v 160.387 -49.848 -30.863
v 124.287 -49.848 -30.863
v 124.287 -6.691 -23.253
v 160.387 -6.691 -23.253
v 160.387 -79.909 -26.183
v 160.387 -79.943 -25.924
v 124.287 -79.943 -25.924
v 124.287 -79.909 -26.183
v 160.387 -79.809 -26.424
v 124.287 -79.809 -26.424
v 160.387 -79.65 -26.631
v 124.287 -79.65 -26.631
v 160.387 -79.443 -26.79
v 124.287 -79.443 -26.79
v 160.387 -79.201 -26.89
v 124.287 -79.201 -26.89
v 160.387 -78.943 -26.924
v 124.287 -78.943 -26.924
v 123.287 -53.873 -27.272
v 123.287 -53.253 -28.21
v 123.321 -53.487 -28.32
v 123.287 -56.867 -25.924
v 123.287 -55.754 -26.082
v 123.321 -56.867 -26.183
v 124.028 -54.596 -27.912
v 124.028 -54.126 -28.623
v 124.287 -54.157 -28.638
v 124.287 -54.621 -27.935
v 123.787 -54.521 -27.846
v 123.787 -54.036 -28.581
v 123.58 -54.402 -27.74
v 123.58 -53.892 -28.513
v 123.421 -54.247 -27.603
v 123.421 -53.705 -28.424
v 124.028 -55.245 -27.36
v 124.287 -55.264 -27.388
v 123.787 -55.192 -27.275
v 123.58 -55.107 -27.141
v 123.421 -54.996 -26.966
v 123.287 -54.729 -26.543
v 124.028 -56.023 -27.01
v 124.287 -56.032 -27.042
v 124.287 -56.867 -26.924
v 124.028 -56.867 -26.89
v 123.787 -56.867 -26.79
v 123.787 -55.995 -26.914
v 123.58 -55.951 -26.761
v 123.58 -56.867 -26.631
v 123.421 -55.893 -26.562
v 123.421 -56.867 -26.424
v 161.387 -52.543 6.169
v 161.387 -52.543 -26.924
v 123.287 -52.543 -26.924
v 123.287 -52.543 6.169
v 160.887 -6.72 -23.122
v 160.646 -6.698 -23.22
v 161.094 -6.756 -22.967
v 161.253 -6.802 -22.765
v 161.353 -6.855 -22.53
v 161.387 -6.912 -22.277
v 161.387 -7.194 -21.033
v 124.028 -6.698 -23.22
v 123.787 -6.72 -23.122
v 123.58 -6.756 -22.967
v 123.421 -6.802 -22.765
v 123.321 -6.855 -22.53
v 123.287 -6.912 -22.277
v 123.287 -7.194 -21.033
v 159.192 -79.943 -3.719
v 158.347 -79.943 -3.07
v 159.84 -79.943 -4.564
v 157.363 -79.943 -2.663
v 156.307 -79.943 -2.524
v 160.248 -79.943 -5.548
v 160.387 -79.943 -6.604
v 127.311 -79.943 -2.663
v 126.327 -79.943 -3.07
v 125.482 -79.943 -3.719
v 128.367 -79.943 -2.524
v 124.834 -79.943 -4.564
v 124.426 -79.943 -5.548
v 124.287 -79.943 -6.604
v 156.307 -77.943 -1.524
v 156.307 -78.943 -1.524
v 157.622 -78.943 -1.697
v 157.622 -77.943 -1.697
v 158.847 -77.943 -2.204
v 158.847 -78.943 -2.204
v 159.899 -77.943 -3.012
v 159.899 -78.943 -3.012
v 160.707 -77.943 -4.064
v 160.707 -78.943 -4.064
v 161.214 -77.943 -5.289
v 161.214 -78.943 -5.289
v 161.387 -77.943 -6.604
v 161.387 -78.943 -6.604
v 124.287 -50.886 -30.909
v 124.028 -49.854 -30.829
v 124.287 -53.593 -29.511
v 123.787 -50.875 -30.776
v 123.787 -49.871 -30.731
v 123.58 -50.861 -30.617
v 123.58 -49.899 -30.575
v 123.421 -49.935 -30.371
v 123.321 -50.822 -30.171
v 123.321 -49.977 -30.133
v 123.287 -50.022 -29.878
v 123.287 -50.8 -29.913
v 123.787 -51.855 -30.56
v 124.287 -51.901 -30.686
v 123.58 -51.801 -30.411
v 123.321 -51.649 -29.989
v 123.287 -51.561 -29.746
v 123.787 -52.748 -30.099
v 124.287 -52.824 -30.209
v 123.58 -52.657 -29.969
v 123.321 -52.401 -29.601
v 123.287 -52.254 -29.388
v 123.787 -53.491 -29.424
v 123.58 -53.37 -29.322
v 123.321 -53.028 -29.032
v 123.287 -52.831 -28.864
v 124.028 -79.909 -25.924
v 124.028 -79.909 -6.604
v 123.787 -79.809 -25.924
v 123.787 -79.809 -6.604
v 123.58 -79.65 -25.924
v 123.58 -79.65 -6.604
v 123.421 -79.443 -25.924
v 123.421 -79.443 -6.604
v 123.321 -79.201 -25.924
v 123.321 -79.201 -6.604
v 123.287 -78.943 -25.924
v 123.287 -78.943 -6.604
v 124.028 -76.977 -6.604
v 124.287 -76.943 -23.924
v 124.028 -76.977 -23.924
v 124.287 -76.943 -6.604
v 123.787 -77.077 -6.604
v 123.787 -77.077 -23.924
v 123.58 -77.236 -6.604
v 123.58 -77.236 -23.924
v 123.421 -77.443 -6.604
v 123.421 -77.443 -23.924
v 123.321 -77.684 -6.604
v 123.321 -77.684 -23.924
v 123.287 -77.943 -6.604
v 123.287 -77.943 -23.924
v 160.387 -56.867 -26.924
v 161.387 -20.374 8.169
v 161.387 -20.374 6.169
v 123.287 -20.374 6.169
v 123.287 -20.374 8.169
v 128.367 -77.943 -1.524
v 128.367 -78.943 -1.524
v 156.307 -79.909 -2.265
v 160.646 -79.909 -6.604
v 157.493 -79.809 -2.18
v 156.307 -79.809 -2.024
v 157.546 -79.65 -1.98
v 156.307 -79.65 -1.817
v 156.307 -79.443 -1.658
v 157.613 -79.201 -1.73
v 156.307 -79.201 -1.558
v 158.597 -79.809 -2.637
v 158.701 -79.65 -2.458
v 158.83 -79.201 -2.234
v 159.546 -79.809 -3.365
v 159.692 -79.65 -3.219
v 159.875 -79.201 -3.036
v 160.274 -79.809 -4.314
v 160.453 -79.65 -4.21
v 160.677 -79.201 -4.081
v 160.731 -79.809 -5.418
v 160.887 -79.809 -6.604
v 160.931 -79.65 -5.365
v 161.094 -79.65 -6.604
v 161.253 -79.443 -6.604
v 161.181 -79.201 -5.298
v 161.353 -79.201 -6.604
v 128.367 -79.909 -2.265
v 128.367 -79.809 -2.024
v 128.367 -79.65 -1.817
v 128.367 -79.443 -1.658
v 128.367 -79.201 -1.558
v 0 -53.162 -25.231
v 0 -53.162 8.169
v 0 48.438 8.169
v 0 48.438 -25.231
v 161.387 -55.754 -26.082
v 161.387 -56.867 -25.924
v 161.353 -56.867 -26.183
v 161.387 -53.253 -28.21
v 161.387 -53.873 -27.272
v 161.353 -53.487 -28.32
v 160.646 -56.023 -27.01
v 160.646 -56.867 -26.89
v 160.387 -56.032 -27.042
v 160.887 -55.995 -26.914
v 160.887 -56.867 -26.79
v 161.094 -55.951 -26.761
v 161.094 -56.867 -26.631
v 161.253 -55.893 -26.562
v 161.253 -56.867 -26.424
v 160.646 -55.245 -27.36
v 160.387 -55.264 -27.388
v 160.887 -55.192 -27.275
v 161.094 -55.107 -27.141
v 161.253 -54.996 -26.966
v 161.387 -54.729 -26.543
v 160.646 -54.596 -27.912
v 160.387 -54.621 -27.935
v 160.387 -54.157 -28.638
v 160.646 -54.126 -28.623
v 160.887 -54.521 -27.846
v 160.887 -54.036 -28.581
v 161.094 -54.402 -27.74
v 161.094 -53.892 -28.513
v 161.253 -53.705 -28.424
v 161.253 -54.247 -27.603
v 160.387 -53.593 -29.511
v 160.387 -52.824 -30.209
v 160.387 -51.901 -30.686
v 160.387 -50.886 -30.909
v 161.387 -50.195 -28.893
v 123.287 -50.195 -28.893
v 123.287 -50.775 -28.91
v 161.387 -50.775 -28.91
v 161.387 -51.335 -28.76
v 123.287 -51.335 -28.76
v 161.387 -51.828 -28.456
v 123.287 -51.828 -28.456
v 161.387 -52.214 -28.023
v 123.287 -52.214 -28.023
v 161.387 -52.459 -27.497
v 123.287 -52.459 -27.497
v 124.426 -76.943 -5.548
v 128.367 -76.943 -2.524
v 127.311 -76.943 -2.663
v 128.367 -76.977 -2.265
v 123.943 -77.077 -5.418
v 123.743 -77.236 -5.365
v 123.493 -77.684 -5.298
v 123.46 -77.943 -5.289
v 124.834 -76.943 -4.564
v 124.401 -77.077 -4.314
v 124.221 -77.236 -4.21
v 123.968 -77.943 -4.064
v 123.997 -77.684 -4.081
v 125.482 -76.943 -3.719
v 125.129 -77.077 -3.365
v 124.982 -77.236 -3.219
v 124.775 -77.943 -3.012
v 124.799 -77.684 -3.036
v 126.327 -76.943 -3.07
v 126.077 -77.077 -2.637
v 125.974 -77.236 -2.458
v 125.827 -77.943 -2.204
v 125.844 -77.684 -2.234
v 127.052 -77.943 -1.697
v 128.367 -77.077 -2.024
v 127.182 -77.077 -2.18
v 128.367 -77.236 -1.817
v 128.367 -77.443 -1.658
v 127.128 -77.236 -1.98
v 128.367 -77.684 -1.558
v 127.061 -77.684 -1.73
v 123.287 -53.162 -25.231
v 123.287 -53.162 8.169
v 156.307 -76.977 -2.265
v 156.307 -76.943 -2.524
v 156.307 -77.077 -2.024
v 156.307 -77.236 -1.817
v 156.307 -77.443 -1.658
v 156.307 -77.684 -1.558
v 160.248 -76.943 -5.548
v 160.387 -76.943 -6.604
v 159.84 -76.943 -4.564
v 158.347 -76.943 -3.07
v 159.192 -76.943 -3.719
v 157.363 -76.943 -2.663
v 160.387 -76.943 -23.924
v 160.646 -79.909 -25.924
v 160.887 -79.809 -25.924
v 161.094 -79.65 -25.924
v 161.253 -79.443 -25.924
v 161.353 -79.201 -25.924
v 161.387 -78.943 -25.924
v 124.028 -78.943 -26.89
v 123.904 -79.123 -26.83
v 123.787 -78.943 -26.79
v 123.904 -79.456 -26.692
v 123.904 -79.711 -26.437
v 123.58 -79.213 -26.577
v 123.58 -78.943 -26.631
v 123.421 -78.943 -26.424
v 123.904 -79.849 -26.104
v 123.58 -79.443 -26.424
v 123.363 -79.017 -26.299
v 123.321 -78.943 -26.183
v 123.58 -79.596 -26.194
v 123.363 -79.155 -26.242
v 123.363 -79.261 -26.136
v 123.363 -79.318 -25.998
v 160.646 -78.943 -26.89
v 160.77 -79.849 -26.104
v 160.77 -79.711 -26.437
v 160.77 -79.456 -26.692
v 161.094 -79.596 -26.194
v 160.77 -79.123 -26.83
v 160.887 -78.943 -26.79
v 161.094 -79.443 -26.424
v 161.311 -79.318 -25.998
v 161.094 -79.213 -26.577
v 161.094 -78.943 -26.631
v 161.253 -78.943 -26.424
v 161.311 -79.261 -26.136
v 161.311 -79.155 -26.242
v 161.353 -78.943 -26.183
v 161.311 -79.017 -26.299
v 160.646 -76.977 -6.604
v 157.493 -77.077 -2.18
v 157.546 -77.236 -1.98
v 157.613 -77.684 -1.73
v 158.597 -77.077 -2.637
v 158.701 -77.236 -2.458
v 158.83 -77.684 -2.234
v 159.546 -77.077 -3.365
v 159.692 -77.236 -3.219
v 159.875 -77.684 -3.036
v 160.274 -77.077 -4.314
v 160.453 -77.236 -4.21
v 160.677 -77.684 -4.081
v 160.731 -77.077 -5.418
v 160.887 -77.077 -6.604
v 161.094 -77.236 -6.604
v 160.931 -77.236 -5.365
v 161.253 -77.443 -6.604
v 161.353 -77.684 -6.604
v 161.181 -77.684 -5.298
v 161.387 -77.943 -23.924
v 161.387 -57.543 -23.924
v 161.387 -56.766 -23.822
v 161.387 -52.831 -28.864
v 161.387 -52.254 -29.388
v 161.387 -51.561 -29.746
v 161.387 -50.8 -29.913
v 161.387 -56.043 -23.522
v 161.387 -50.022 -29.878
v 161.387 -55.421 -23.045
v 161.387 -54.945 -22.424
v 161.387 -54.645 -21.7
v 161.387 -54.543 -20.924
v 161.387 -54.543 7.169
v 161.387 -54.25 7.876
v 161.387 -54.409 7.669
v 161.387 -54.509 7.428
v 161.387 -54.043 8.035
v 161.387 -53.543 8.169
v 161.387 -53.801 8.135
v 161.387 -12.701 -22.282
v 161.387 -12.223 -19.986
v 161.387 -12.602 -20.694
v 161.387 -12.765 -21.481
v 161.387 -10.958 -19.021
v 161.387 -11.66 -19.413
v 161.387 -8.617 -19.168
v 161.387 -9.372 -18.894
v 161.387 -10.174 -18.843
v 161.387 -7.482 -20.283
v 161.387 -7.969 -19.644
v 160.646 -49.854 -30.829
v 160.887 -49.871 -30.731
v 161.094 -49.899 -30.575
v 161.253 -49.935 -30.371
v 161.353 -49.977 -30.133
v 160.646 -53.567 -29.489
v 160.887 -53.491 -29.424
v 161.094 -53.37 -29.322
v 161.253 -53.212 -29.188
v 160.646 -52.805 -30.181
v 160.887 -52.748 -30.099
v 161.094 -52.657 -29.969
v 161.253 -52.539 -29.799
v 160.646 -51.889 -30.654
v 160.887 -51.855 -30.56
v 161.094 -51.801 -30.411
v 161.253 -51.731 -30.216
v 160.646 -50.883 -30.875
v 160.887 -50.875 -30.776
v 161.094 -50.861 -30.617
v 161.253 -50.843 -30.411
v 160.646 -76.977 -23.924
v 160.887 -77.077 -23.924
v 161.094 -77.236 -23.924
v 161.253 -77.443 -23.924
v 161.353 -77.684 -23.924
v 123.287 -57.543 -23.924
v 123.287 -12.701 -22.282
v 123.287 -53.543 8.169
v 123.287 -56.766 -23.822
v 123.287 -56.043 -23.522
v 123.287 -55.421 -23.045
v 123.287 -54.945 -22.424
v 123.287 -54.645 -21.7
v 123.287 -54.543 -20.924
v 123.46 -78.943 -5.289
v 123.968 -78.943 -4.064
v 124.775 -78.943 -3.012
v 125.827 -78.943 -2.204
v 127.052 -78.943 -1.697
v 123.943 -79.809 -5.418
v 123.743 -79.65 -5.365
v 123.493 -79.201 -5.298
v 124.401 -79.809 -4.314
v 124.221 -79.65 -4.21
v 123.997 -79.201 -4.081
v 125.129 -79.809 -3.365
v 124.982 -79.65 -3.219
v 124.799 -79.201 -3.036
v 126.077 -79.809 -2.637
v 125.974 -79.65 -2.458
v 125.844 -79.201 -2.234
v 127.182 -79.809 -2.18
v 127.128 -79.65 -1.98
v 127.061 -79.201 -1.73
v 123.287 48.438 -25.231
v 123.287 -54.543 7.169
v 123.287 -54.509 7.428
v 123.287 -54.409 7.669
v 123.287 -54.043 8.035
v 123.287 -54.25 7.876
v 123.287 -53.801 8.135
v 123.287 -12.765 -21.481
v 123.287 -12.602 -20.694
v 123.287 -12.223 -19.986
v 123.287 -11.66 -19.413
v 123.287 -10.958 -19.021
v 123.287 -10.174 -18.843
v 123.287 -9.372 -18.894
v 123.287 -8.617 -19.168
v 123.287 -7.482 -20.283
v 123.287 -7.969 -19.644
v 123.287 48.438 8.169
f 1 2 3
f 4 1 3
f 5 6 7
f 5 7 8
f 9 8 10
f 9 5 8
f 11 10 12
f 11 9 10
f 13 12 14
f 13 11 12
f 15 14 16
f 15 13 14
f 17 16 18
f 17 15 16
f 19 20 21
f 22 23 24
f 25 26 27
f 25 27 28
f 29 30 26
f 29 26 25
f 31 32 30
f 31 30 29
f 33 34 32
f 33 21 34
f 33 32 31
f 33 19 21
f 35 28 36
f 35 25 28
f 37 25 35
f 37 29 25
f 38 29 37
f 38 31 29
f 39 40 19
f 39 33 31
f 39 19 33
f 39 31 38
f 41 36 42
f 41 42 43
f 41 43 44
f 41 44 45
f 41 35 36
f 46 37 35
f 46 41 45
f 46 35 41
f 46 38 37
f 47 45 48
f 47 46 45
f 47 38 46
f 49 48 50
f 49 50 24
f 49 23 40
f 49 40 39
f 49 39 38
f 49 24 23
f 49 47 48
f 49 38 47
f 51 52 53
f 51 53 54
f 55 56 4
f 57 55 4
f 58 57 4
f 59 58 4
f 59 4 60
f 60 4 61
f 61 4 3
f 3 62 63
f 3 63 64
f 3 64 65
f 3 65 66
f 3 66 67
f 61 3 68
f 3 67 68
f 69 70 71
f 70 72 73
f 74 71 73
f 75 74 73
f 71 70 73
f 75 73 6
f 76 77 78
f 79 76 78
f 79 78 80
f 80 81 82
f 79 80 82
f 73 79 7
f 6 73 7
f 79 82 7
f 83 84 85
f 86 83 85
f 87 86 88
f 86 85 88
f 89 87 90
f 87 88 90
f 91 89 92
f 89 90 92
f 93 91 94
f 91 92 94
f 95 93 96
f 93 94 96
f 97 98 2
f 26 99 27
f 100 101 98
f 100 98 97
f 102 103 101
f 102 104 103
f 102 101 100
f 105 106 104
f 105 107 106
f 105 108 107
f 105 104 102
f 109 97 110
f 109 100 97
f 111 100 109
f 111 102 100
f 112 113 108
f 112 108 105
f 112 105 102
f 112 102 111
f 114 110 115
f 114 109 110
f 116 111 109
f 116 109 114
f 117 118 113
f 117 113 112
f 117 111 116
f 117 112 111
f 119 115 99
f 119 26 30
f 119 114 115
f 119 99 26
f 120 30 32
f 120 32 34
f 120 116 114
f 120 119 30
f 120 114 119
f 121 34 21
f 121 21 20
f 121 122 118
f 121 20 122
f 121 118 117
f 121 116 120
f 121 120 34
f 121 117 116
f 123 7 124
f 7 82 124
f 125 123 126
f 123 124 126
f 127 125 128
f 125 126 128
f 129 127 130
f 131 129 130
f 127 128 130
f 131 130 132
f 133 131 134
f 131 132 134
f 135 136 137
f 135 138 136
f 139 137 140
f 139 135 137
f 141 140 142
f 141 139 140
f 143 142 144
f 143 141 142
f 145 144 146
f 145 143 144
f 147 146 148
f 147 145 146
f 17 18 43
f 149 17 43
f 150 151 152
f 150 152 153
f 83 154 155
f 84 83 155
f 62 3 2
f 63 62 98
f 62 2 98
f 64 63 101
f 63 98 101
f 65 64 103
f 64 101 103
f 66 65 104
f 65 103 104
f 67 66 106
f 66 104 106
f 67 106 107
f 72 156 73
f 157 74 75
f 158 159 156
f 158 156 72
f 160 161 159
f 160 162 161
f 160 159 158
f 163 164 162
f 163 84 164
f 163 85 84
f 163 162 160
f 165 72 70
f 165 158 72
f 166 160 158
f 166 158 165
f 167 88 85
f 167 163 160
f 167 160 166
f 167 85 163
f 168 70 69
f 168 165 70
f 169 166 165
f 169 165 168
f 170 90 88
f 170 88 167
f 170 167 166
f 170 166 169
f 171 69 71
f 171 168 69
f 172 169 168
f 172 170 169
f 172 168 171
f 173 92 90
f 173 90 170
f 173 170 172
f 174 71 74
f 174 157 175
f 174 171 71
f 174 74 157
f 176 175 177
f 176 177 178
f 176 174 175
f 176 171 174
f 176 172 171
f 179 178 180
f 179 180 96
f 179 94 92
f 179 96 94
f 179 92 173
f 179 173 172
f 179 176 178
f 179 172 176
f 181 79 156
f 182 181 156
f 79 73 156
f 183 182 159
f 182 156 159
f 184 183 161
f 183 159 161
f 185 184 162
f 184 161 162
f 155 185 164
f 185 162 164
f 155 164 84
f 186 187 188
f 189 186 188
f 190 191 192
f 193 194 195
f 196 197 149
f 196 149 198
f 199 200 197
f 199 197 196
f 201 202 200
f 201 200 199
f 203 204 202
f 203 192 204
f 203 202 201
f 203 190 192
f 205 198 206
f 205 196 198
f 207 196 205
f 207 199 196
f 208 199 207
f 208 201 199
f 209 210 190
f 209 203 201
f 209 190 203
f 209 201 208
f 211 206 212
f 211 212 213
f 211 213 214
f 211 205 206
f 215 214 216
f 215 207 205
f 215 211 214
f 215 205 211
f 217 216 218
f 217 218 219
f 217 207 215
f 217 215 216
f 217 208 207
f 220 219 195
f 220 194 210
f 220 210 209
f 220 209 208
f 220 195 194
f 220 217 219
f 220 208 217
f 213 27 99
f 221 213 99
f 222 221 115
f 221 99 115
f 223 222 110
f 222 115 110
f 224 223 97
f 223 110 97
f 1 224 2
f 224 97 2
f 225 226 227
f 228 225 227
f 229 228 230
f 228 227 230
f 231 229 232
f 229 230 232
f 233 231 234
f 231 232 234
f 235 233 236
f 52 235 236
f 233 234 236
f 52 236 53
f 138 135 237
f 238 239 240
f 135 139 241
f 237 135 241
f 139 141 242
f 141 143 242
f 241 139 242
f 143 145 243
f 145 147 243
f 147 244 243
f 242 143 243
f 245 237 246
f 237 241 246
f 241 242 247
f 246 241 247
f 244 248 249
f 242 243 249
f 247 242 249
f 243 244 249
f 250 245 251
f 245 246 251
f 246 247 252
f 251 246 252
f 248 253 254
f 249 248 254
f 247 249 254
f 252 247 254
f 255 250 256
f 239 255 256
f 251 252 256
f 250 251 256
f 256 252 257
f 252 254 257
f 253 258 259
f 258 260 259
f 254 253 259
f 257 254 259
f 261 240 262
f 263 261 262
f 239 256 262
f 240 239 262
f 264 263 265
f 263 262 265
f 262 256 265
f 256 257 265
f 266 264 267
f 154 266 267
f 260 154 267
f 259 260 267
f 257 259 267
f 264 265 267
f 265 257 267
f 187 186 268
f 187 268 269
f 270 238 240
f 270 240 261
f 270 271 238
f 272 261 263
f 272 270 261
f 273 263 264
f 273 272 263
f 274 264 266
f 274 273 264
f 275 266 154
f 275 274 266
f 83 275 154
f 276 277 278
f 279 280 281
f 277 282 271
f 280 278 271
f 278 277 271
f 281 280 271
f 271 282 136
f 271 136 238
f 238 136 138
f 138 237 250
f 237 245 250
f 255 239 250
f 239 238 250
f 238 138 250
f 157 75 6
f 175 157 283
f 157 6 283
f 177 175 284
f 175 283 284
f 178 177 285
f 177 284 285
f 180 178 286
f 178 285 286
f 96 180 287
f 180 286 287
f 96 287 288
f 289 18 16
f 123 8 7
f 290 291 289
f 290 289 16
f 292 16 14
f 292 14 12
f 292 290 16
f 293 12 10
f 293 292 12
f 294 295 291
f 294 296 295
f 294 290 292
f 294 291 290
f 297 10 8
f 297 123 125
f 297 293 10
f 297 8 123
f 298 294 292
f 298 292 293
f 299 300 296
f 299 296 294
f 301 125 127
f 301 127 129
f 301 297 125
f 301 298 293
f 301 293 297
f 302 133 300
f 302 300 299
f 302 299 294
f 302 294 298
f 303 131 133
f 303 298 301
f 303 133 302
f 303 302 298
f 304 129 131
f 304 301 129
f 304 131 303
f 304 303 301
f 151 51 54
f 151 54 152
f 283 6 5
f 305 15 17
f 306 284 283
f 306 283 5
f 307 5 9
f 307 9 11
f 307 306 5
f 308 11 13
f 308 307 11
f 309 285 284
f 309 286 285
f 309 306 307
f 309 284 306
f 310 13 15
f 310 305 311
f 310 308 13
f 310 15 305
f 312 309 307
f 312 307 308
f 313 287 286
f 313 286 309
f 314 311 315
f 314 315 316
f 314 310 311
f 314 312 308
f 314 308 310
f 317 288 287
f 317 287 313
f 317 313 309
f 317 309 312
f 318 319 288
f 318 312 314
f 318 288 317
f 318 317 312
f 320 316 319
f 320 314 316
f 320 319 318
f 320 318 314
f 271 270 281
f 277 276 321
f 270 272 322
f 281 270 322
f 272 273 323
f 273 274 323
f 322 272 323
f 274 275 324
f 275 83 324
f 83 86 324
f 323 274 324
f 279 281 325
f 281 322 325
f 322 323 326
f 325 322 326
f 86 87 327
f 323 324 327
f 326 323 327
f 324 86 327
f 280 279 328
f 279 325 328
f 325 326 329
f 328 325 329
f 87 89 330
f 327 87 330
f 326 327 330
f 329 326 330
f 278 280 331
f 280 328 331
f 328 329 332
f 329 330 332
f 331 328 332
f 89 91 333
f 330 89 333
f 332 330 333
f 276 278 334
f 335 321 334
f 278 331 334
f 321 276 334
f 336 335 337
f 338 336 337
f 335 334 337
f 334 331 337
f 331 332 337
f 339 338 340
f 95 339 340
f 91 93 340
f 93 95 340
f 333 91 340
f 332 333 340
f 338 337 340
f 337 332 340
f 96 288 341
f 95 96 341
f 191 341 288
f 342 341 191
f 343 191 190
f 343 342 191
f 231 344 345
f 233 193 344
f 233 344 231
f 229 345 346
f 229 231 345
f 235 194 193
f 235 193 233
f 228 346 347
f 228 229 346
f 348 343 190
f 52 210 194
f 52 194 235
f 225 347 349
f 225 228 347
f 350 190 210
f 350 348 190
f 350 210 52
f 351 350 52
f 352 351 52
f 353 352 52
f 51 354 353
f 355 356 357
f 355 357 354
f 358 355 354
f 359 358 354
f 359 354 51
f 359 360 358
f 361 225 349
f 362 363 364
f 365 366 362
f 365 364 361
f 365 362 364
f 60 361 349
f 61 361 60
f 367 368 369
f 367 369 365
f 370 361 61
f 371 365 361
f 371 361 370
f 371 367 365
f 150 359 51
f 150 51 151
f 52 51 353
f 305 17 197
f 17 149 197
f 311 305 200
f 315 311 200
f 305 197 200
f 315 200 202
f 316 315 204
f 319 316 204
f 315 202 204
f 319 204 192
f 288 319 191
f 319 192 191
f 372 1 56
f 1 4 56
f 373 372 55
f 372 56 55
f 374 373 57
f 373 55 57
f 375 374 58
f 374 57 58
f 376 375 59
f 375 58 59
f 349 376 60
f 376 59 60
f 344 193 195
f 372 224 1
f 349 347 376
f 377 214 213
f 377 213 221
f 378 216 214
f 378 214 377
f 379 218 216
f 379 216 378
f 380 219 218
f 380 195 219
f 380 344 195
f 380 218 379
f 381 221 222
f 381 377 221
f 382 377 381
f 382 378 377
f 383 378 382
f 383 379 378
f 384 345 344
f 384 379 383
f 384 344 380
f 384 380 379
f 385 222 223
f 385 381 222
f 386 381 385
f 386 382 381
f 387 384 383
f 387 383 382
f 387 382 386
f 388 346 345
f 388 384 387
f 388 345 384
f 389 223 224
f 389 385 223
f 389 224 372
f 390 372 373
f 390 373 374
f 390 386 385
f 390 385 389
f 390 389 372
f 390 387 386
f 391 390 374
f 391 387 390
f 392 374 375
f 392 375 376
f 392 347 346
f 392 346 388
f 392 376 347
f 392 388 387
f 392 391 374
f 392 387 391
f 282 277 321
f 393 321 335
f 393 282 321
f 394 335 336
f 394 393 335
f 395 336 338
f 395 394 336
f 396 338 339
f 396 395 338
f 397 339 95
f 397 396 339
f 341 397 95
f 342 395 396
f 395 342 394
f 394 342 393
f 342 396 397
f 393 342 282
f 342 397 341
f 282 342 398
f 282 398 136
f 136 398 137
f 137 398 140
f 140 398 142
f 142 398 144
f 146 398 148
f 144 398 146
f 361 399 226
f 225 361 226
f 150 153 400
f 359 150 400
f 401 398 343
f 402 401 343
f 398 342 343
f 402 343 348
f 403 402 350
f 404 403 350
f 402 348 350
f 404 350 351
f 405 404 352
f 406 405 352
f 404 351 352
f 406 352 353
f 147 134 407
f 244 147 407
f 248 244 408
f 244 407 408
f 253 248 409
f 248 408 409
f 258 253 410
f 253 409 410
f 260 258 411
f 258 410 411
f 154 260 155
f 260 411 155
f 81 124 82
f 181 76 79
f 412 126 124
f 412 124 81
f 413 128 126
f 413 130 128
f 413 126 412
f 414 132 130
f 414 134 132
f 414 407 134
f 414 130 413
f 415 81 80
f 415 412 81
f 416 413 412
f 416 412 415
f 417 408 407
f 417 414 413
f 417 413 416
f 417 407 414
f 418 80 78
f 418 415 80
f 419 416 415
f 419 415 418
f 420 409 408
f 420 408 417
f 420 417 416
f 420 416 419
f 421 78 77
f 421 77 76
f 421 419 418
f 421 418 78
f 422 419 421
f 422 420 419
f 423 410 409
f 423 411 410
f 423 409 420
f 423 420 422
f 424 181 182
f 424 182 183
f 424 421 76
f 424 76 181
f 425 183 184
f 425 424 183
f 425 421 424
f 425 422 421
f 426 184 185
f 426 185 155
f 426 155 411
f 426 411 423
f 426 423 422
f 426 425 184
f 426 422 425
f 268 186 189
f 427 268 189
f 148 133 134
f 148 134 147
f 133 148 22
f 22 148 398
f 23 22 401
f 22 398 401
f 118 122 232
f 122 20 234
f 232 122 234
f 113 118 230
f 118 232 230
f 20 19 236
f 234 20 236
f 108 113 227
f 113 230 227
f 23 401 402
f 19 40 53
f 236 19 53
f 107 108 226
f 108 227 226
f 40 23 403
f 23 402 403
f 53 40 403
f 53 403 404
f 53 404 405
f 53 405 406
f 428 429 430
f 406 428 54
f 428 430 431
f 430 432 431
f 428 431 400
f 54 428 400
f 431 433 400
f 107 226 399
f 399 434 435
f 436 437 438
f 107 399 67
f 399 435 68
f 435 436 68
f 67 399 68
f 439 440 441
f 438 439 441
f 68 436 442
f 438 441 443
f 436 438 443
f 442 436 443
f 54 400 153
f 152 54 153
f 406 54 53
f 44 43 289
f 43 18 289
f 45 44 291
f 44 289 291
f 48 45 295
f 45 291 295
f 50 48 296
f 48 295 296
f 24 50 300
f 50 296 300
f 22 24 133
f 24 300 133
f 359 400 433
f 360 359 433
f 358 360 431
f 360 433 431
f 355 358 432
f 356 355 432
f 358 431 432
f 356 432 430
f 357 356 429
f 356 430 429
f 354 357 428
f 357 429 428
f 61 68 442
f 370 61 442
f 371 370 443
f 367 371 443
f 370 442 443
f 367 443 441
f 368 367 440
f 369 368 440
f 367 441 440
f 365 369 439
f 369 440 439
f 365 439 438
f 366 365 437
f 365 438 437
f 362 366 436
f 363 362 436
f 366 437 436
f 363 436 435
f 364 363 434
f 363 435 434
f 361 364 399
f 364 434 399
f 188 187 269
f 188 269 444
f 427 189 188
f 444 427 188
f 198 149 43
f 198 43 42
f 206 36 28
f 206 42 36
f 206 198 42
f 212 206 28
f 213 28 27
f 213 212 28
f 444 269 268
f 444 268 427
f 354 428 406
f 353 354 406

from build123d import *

# Parameters (mm, degrees)
F0_W     = 101.6
F0_H     = 33.4
F1_DEPTH = 123.28711
F3_DEPTH = 38.1
F4_R     = 1
F5_R     = 3
F6_R     = 5.08
F7_R     = 1


with BuildPart() as f1:
    # F0 (on Right) → F1 (new body)
    with BuildSketch(Plane.YZ):
        with Locations((-2.3622444451, -8.5308100462)):
            Rectangle(F0_W, F0_H)
    extrude(amount=F1_DEPTH)


with BuildPart() as f3:
    # F2 (on face) → F3 (new body)
    with BuildSketch(Plane.YZ.offset(123.28711)):
        with BuildLine():
            Line((-20.3735399991, 6.1691899538), (-20.3735399991, 8.1691899538))
            Line((-20.3735399991, 8.1691899538), (-53.5426569879, 8.1691899538))
            ThreePointArc((-53.5426569879, 8.1691899538), (-54.2497637691, 7.876296735), (-54.5426569879, 7.1691899538))
            Line((-54.5426569879, 7.1691899538), (-54.5426569879, -23.9238089242))
            Line((-54.5426569879, -23.9238089242), (-76.9426569879, -23.9238089242))
            Line((-76.9426569879, -23.9238089242), (-76.9426569879, -1.5238089242))
            Line((-76.9426569879, -1.5238089242), (-79.9426569879, -1.5238089242))
            Line((-79.9426569879, -1.5238089242), (-79.9426569879, -23.9238089242))
            Line((-79.9426569879, -23.9238089242), (-79.9426569879, -26.9238089242))
            Line((-79.9426569879, -26.9238089242), (-54.5426569879, -26.9238089242))
            ThreePointArc((-54.5426569879, -26.9238089242), (-53.1138074267, -29.9879866967), (-49.8480642772, -30.8630399363))
            Line((-49.8480642772, -30.8630399363), (-6.690798263, -23.2532495244))
            Line((-6.690798263, -23.2532495244), (-7.1944188543, -21.0330628785))
            ThreePointArc((-7.1944188543, -21.0330628785), (-10.5722276228, -18.9043396003), (-12.700950901, -22.2821483688))
            Line((-12.700950901, -22.2821483688), (-50.1953606326, -28.8934244303))
            ThreePointArc((-50.1953606326, -28.8934244303), (-51.8282322073, -28.4558978105), (-52.5426569879, -26.9238089242))
            Line((-52.5426569879, -26.9238089242), (-52.5426569879, 6.1691899538))
            Line((-52.5426569879, 6.1691899538), (-20.3735399991, 6.1691899538))
        make_face()
    extrude(amount=F3_DEPTH)

    # F4
    f4_edges = [f3.edges().sort_by_distance(p)[0] for p in [
        (142.33711, -79.942657, -26.923809),
    ]]
    fillet(f4_edges, radius=F4_R)

    # F5
    f5_edges = [f3.edges().sort_by_distance(p)[0] for p in [
        (142.33711, -54.542657, -23.923809),
        (142.33711, -54.542657, -26.923809),
    ]]
    fillet(f5_edges, radius=F5_R)

    # F6
    f6_edges = [f3.edges().sort_by_distance(p)[0] for p in [
        (123.28711, -78.442657, -1.523809),
        (161.38711, -78.442657, -1.523809),
    ]]
    fillet(f6_edges, radius=F6_R)

    # F7
    f7_edges = [f3.edges().sort_by_distance(p)[0] for p in [
        (159.899212, -76.942657, -3.011706),
        (161.38711, -78.442657, -6.603809),
        (156.30711, -78.442657, -1.523809),
        (159.899212, -79.942657, -3.011706),
        (142.33711, -76.942657, -1.523809),
        (128.36711, -78.442657, -1.523809),
        (142.33711, -79.942657, -1.523809),
        (124.775008, -76.942657, -3.011706),
        (123.28711, -78.442657, -6.603809),
        (124.775008, -79.942657, -3.011706),
    ]]
    fillet(f7_edges, radius=F7_R)


solid = Compound([f1.part, f3.part])
